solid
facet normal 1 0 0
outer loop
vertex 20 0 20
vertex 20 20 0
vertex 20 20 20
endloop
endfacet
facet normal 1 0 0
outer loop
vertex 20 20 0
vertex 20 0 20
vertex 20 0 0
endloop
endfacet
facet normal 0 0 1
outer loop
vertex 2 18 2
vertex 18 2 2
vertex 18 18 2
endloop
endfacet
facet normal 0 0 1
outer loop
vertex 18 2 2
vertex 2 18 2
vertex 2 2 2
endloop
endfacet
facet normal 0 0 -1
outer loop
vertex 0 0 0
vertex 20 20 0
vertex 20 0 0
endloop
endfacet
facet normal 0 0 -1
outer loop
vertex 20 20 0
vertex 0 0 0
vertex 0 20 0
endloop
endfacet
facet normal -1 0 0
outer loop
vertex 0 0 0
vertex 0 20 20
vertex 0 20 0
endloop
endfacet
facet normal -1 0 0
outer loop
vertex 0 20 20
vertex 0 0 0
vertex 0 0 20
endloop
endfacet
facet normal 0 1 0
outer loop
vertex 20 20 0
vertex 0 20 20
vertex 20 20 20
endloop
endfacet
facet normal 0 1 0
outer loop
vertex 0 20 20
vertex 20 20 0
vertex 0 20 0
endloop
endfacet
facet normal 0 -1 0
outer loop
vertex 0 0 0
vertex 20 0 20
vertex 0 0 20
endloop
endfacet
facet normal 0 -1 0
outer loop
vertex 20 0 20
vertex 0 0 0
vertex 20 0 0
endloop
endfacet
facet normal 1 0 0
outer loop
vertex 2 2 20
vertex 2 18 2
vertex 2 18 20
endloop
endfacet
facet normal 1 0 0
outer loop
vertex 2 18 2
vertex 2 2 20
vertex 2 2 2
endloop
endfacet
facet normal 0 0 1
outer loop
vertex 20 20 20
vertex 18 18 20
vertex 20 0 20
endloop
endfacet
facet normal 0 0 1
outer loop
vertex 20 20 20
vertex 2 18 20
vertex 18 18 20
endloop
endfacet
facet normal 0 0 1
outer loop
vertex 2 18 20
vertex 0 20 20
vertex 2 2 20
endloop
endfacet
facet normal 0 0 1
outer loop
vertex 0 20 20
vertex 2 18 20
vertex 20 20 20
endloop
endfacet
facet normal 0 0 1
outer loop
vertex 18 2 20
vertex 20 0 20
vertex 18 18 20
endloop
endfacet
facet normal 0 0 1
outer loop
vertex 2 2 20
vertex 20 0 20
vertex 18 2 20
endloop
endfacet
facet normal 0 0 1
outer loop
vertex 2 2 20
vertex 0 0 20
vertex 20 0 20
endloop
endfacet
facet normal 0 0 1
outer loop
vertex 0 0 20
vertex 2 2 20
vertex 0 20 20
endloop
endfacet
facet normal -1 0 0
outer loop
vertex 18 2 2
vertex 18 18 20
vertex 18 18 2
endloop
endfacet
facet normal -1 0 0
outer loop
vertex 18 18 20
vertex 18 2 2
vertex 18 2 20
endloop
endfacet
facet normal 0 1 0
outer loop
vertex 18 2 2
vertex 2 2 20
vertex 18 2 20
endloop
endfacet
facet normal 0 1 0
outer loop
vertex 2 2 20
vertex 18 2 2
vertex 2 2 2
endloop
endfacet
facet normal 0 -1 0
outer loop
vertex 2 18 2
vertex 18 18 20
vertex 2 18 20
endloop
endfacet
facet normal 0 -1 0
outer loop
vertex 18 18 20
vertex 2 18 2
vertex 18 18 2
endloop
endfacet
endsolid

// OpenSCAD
/*
Exercício 1:
Criar uma caixa com dimensões esternas de 20x20x20mm e espessura de 2mm
usando cube(), union() e translate()
*/
//base
cube([20,20,2]);

//lateral esquerda
cube([2,20,20]);

//lateral direita
translate([18,0,0]) cube([2,20,20]);

//frente
cube([20,2,20]);

//fundo
translate([0,18,0]) cube([20,2,20]);
